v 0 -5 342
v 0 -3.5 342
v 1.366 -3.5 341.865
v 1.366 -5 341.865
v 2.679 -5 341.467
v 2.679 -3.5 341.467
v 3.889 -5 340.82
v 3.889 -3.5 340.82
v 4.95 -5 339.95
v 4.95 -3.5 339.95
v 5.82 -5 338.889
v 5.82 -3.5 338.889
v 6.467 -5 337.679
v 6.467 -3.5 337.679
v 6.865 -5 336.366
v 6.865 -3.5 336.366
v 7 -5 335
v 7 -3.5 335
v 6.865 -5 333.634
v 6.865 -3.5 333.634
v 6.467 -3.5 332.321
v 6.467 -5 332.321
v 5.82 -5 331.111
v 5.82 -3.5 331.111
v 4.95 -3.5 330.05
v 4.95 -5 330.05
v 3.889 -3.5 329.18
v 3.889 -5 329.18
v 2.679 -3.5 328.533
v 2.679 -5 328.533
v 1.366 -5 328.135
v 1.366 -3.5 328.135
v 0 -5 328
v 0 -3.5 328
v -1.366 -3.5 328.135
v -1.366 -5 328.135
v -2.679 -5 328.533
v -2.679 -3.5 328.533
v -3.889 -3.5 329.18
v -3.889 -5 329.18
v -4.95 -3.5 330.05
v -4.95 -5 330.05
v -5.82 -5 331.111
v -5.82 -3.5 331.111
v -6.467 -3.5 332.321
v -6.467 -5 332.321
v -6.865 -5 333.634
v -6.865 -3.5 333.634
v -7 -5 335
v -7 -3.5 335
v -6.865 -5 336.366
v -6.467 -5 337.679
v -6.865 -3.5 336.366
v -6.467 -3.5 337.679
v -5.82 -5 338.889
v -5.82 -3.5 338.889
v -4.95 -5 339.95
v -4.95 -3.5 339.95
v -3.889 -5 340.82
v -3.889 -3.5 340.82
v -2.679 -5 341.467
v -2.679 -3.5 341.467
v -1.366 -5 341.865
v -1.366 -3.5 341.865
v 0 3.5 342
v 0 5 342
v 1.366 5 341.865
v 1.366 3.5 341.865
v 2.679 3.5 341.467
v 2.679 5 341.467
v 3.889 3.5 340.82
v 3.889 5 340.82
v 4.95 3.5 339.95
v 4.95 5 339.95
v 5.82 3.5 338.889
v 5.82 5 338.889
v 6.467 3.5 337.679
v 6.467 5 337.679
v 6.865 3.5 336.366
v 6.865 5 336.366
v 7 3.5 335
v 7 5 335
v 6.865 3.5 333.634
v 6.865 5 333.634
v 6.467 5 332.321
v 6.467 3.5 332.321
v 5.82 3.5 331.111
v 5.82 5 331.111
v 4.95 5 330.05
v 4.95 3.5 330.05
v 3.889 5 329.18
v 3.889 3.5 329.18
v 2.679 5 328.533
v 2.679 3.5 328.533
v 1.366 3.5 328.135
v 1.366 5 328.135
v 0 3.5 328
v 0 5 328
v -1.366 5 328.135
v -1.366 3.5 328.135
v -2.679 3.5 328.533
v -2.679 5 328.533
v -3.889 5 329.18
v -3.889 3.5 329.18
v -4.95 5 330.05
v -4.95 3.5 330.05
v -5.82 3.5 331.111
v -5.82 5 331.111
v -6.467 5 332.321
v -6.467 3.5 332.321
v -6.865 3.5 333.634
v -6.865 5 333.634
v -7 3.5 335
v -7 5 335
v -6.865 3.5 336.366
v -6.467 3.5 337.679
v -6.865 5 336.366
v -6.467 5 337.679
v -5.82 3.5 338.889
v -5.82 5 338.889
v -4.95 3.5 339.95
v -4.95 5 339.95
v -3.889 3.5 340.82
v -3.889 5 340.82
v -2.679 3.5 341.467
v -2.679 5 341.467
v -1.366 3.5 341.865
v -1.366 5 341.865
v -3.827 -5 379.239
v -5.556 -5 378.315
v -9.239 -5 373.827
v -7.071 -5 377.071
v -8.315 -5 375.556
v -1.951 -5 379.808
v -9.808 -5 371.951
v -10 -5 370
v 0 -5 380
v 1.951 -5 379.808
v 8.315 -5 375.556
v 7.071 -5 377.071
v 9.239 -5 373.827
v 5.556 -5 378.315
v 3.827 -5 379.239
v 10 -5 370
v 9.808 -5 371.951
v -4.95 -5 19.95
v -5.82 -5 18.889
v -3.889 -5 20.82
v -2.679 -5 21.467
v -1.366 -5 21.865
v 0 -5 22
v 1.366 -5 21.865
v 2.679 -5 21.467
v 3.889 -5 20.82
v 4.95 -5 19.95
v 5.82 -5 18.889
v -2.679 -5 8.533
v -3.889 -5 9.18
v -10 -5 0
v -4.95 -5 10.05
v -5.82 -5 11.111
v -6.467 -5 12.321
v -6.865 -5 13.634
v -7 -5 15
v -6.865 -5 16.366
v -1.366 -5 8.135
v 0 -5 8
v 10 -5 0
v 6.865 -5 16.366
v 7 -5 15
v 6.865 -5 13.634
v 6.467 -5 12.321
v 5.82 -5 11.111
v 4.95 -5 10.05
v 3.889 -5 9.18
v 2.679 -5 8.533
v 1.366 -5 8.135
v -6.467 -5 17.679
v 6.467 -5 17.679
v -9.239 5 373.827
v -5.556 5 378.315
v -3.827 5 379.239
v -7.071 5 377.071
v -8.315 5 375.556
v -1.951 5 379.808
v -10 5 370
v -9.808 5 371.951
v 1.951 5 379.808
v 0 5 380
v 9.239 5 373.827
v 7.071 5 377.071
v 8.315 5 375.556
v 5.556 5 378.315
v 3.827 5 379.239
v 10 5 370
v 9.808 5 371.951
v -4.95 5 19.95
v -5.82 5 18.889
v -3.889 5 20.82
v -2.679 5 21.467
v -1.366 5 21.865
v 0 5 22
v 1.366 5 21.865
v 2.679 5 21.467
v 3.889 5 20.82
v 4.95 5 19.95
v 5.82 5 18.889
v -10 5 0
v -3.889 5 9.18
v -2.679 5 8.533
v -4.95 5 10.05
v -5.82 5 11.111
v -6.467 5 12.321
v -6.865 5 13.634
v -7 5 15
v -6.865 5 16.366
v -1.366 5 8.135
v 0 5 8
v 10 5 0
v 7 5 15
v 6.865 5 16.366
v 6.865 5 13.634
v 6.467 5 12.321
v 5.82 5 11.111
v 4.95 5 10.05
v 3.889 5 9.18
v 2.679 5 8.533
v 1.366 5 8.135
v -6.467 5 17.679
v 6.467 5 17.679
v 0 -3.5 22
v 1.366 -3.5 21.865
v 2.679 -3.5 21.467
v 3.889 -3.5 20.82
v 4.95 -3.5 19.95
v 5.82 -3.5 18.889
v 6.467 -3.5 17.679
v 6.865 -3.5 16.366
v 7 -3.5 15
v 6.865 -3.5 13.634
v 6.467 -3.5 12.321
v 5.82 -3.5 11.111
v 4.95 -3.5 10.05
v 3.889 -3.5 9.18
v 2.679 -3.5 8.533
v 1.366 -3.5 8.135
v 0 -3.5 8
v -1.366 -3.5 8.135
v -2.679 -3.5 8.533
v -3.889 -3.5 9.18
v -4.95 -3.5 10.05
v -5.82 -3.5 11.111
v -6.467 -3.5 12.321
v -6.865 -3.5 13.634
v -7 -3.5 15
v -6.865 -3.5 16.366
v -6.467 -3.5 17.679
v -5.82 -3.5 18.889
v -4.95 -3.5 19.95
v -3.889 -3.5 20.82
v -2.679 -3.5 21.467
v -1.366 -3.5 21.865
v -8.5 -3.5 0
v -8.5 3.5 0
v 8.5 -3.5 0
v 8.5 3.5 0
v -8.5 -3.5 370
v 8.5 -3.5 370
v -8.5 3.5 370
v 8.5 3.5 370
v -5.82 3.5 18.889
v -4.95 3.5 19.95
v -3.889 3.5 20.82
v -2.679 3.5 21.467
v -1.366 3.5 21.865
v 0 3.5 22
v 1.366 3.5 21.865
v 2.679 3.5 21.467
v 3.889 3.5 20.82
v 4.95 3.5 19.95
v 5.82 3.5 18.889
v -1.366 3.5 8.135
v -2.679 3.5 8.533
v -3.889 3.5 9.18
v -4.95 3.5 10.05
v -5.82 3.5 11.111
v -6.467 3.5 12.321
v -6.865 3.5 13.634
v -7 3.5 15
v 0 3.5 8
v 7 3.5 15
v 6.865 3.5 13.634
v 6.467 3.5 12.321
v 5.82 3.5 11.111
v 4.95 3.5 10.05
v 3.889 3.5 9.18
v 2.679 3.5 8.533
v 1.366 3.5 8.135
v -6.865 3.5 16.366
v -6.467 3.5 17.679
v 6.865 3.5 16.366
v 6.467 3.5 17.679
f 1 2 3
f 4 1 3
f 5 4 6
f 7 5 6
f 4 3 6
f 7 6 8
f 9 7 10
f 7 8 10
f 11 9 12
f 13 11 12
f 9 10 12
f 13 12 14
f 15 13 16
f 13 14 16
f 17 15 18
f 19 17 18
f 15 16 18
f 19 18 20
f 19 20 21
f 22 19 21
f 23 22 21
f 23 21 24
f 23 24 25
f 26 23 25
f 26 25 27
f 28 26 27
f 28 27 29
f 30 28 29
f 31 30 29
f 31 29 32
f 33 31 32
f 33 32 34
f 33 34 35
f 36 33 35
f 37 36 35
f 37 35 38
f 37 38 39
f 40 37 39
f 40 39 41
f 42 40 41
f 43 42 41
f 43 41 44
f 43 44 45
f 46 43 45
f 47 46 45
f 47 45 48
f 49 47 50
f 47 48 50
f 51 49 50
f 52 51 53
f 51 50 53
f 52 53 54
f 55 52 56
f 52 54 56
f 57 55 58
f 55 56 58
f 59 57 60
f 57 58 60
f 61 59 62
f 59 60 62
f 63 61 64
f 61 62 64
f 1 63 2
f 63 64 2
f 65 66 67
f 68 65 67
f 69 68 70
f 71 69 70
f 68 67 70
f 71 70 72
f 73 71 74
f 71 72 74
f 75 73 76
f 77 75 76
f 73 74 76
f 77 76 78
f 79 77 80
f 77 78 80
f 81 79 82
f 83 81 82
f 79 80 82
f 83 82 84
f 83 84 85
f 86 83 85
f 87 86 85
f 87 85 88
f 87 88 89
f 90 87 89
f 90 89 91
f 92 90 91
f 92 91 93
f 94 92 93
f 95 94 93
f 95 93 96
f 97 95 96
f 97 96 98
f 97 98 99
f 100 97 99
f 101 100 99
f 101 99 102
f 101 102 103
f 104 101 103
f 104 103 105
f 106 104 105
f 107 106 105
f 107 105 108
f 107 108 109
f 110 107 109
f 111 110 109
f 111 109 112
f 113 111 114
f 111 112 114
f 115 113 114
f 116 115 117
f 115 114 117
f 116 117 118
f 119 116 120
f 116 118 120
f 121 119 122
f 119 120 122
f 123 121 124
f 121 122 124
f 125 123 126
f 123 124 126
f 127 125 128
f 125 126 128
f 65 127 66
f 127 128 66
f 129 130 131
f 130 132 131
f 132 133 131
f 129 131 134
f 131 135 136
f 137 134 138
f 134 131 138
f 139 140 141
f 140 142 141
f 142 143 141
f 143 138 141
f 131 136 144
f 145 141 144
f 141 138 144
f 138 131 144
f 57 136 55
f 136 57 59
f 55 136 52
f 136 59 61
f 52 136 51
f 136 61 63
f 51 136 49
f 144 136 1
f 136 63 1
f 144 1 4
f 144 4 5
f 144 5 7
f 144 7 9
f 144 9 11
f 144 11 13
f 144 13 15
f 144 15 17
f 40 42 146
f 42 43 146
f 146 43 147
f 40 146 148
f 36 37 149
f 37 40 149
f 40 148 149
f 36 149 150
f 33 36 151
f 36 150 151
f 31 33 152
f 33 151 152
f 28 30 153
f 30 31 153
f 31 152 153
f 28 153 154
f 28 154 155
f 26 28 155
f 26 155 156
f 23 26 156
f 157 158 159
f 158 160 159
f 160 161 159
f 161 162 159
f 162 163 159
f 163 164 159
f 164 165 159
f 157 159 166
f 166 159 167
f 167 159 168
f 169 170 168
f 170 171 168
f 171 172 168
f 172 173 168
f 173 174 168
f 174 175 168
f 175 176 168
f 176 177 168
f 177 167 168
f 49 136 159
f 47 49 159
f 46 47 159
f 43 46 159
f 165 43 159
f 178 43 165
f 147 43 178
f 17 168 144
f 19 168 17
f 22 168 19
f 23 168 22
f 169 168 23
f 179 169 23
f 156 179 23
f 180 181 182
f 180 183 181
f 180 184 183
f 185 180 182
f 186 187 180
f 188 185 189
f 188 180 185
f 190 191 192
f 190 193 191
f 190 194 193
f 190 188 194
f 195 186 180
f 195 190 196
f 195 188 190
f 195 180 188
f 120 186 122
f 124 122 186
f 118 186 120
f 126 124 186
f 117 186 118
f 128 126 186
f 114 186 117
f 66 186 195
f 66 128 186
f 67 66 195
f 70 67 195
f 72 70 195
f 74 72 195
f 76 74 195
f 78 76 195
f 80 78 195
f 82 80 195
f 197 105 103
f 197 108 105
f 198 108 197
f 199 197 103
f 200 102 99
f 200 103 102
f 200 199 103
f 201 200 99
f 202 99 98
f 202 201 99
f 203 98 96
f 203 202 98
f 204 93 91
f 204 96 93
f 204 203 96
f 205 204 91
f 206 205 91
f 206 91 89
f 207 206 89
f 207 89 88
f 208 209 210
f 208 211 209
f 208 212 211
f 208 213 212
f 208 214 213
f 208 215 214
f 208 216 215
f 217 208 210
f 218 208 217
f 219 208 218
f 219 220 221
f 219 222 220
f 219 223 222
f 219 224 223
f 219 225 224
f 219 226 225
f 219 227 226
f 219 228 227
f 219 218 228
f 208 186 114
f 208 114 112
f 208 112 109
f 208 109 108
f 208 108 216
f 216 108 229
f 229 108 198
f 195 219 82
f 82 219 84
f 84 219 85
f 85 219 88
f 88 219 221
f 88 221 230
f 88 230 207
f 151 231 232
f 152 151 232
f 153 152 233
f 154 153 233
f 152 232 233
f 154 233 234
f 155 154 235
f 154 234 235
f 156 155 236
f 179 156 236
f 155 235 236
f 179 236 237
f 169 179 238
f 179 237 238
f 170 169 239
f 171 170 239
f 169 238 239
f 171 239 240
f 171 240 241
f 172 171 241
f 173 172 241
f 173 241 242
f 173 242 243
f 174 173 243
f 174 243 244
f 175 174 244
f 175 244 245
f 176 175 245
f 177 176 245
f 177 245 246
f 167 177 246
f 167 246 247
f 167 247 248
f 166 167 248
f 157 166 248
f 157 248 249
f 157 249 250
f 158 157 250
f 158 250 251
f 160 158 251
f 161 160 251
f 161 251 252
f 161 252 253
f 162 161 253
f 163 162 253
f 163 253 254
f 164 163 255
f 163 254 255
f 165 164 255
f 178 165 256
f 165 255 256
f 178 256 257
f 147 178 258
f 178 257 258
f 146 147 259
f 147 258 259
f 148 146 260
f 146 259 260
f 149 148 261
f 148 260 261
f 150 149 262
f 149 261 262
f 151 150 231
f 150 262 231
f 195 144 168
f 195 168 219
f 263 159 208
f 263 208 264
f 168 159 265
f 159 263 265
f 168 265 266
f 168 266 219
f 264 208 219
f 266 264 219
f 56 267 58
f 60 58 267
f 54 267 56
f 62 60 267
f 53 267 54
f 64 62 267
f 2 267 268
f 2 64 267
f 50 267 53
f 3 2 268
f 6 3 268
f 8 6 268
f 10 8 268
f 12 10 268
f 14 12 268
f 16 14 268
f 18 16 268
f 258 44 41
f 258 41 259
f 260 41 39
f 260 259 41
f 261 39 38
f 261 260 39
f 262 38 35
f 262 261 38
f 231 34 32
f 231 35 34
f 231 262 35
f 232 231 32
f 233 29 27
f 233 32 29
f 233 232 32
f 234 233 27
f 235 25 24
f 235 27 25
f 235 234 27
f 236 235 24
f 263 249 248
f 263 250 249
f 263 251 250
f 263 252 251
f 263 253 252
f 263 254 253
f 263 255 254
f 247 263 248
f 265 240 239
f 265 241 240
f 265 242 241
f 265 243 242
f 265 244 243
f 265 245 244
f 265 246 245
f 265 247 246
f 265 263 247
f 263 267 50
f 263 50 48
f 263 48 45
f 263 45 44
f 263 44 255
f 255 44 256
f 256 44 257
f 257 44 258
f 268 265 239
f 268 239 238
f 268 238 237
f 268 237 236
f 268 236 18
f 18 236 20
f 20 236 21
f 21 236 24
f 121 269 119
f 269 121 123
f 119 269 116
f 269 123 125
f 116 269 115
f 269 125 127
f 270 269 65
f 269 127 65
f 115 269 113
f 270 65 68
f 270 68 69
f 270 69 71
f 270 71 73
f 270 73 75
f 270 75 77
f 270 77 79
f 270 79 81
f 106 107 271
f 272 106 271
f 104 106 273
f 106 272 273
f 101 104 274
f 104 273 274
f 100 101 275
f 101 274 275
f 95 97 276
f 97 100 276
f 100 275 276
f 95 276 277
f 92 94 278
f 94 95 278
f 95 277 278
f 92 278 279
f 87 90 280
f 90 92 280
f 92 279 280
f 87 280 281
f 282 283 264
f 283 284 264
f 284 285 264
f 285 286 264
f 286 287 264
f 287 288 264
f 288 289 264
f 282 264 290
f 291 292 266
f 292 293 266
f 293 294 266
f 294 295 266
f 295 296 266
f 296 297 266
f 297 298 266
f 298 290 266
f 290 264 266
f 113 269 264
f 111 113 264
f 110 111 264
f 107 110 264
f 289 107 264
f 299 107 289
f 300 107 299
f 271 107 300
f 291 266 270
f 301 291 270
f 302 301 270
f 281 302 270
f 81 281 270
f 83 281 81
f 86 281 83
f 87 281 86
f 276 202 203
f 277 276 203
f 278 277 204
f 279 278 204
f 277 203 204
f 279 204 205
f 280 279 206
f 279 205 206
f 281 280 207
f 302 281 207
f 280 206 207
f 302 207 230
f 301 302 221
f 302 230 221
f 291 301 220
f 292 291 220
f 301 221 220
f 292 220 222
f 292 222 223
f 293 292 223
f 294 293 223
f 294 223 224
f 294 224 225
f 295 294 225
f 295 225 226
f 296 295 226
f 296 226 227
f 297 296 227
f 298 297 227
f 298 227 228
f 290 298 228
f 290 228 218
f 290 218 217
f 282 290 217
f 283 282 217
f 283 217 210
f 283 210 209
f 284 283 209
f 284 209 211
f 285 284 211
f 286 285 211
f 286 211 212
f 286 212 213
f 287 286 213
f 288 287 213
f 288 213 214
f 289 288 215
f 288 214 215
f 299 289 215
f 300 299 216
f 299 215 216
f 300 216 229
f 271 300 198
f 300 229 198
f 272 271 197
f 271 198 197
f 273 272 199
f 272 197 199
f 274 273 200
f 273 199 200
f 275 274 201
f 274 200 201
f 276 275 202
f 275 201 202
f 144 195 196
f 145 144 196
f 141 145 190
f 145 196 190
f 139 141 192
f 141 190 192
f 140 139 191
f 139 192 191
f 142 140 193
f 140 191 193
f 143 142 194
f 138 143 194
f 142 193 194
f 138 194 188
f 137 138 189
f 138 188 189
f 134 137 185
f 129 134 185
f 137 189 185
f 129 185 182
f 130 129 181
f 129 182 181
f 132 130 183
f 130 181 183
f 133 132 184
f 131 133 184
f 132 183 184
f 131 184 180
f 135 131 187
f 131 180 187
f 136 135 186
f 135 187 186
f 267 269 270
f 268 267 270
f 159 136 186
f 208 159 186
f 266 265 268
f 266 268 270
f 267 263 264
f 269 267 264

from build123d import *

# Parameters (mm, degrees)
SKETCH_1_W          = 20
SKETCH_1_H          = 10
SKETCH_1_W_2        = 17
SKETCH_1_H_2        = 7
EXTRUDE_1_DEPTH     = 370
SKETCH_2_R          = 7
CUT_EXTRUDE_1_DEPTH = 10
EXTRUDE_2_DEPTH     = 10


with BuildPart() as part:
    # 草图1 → 凸台-拉伸1 (new body)
    with BuildSketch(Plane.XY):
        Rectangle(SKETCH_1_W, SKETCH_1_H)
        Rectangle(SKETCH_1_W_2, SKETCH_1_H_2, mode=Mode.SUBTRACT)
    extrude(amount=EXTRUDE_1_DEPTH)

    # 草图2 → 切除-拉伸1 (cut)
    with BuildSketch(Plane(origin=(0, 5, 0), x_dir=(1, 0, 0), z_dir=(0, 1, 0))):
        with Locations(Location((0, -15, 0), (0, 0, 270))):
            Circle(SKETCH_2_R)
        with Locations(Location((0, -335, 0), (0, 0, 270))):
            Circle(SKETCH_2_R)
    extrude(amount=-CUT_EXTRUDE_1_DEPTH, mode=Mode.SUBTRACT)

    # 草图3 → 凸台-拉伸2 (add)
    with BuildSketch(Plane(origin=(0, 5, 0), x_dir=(1, 0, 0), z_dir=(0, 1, 0))):
        with BuildLine():
            Line((-10, -370), (10, -370))
            ThreePointArc((10, -370), (0, -380), (-10, -370))
        make_face()
    extrude(amount=-EXTRUDE_2_DEPTH)


solid = part.part
